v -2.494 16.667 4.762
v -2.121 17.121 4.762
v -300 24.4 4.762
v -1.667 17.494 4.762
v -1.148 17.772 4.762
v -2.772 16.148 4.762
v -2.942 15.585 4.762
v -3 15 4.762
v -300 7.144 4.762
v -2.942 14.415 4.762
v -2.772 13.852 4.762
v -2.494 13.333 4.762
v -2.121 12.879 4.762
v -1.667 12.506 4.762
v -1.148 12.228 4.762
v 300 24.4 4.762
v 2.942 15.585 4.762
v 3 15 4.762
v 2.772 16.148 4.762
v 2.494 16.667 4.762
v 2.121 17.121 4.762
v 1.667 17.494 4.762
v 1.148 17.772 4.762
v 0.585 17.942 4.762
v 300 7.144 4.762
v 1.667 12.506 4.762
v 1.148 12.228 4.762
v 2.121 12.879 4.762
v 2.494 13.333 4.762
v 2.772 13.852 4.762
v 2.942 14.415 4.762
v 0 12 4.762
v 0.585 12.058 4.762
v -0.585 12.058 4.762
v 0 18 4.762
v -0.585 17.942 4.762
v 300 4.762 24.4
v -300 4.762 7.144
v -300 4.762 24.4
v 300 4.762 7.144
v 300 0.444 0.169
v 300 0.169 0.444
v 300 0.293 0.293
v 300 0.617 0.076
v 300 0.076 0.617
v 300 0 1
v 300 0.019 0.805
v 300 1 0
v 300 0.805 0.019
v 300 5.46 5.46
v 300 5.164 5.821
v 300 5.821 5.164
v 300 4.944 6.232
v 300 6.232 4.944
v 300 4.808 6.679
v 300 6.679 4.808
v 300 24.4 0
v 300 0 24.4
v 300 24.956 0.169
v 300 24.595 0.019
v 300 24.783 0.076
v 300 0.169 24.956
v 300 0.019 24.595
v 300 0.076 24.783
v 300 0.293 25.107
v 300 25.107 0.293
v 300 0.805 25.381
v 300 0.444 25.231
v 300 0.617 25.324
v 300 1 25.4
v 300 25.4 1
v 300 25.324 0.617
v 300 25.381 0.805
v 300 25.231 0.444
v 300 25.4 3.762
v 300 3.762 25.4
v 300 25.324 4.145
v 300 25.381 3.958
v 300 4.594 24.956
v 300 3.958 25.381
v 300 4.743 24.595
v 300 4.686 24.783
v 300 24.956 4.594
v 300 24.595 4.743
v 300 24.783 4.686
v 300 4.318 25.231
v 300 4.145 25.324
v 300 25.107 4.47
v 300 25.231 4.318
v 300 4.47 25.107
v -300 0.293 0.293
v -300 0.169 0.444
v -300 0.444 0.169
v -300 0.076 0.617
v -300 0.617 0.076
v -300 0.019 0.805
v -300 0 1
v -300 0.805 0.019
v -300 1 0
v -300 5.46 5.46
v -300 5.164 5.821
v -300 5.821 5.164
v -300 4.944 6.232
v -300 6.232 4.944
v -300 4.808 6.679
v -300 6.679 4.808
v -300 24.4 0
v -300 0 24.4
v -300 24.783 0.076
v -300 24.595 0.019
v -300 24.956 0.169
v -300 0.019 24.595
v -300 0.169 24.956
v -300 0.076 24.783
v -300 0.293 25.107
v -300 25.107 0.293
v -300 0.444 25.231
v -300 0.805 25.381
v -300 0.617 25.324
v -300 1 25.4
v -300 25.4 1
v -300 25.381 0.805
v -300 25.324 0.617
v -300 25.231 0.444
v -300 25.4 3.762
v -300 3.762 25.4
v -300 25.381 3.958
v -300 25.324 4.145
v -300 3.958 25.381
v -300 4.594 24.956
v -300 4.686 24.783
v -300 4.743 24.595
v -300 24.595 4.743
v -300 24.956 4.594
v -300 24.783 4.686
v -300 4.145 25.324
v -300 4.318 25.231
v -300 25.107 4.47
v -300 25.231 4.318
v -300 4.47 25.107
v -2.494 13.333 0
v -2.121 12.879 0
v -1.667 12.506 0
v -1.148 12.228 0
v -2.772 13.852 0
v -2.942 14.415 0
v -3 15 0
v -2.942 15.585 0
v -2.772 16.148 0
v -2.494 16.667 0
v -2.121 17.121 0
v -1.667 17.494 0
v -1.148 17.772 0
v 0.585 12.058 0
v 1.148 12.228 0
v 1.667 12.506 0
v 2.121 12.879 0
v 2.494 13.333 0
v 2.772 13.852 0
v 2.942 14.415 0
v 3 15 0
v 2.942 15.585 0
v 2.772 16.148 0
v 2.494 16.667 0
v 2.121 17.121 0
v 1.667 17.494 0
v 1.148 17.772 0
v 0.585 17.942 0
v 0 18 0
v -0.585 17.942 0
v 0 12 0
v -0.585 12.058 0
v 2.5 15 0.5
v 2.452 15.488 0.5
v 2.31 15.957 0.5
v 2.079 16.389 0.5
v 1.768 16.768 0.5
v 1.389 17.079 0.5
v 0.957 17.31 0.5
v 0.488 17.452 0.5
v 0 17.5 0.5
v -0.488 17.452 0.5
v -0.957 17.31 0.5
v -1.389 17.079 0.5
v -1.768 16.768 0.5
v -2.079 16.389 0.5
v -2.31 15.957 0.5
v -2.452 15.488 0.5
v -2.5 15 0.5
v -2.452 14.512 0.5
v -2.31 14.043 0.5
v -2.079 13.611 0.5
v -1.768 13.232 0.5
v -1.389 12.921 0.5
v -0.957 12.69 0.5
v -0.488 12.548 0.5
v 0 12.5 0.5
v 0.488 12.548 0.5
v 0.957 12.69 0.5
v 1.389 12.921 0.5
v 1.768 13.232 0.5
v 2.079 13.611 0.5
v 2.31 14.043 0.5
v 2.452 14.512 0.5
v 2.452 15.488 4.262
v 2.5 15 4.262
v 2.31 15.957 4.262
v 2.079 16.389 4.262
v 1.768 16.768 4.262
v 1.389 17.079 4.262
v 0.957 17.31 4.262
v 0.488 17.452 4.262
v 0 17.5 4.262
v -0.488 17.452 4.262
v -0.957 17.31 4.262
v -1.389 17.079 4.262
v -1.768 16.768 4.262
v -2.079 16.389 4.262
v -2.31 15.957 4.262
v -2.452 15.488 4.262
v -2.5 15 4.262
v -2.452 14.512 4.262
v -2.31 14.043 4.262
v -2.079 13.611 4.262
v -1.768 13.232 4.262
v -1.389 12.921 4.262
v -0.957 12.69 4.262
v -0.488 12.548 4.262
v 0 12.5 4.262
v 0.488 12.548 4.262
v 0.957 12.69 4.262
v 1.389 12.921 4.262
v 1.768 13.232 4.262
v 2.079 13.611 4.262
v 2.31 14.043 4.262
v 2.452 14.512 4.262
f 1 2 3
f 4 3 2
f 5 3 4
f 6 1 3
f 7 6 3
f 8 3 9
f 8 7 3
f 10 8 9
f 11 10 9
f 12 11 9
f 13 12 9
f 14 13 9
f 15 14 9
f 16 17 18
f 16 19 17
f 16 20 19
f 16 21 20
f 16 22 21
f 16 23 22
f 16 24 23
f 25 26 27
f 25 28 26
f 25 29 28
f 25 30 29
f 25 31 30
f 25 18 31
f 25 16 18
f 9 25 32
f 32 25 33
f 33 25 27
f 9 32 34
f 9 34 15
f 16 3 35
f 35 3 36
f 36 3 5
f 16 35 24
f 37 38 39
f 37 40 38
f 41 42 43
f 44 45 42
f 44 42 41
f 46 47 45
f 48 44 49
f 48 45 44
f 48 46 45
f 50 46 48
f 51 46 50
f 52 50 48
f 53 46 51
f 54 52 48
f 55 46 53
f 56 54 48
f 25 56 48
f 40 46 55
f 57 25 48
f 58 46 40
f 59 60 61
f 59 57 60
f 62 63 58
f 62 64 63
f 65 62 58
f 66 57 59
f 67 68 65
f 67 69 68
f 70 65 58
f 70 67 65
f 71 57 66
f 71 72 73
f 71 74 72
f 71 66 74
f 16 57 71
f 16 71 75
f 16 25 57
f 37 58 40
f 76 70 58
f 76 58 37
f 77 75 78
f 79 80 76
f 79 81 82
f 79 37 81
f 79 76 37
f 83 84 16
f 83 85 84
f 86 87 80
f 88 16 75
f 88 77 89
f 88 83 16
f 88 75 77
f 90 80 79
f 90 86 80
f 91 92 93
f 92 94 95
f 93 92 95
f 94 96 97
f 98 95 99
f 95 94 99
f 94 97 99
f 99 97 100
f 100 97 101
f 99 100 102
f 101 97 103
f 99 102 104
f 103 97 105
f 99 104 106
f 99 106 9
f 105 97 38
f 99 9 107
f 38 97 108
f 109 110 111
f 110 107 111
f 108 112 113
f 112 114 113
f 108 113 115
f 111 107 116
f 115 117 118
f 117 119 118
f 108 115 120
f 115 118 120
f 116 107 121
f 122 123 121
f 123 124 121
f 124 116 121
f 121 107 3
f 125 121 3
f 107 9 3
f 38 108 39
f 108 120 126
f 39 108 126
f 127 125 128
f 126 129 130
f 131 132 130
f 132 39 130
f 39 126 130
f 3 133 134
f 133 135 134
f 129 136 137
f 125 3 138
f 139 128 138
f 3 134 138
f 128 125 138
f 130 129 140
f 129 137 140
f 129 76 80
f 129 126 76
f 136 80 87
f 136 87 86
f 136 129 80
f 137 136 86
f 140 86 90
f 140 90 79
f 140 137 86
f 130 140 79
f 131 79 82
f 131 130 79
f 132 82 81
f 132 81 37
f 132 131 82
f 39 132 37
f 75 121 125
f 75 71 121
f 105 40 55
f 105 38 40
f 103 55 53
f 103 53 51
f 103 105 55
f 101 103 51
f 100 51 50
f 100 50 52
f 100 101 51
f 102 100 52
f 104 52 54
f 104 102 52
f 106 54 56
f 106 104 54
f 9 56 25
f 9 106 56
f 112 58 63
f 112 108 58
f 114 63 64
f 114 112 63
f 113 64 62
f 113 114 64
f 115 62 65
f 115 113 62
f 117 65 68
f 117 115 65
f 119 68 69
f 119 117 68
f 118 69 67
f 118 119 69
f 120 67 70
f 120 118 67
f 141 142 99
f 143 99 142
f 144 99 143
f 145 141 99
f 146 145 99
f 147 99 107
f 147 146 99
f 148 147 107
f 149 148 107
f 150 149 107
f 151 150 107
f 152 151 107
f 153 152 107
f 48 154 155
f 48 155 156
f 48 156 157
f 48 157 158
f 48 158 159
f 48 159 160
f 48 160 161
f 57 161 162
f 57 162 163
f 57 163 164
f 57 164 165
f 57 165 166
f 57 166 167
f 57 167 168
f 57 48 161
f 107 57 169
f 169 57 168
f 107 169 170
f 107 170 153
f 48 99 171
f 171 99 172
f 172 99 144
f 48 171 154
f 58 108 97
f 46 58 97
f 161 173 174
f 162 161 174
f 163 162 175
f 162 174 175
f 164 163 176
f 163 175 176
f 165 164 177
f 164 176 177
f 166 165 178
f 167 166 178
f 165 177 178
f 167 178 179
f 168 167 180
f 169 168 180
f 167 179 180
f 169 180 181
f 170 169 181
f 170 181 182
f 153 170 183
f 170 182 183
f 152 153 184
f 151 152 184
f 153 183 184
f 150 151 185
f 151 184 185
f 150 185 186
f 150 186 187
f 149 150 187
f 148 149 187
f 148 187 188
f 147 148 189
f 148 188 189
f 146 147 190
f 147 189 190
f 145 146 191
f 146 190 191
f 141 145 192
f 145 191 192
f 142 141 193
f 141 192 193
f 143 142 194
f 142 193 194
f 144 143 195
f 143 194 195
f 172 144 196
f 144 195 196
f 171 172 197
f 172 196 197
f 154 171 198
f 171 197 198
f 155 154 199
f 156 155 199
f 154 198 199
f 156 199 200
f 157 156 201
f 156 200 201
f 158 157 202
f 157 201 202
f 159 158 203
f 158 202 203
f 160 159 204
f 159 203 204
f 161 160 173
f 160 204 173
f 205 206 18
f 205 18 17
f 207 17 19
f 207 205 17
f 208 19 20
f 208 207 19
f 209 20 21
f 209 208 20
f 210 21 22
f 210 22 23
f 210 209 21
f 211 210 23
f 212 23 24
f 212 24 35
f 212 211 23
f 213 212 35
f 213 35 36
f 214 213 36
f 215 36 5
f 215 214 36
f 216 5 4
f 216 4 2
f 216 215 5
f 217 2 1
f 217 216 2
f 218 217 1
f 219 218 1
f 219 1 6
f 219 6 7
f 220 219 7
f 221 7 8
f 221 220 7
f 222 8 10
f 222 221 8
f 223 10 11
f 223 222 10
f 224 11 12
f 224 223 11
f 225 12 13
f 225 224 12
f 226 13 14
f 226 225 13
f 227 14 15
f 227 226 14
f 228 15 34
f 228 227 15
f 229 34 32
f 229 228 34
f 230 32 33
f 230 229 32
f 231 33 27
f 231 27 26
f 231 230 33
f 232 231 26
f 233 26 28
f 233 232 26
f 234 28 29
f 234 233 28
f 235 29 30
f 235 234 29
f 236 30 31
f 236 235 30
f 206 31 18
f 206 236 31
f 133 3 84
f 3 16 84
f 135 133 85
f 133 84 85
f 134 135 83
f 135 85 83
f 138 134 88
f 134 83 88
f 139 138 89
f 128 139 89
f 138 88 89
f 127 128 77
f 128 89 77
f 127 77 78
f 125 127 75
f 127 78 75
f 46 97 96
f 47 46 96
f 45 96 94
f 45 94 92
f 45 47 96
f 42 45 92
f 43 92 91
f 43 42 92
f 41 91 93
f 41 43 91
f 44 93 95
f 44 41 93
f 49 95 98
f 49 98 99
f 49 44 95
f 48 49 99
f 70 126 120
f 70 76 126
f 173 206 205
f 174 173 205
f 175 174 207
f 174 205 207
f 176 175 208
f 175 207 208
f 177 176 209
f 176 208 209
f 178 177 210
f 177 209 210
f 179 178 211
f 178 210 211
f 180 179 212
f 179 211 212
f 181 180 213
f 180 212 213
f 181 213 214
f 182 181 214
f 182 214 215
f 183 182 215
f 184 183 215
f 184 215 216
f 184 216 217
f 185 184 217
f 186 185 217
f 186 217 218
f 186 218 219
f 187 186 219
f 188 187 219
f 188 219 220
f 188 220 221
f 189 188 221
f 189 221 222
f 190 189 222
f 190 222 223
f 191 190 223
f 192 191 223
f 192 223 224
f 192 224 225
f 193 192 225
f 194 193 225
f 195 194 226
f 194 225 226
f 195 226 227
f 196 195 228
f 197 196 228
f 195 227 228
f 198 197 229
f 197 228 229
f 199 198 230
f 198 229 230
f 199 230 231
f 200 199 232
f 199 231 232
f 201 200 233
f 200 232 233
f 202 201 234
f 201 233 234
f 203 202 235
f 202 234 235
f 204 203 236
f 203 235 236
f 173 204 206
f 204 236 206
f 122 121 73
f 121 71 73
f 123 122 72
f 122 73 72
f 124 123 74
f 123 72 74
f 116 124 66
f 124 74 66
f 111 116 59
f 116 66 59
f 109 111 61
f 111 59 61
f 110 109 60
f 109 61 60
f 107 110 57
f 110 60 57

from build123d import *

# Parameters (mm, degrees)
F1_DEPTH = 300
F2_R     = 1
F3_R     = 2.38125
F4_R     = 2.5
F5_DEPTH = 25
F6_SIZE  = 0.5


with BuildPart() as f1:
    # F0 (on Right) → F1 (new body, symmetric)
    with BuildSketch(Plane.YZ):
        Polygon((0, 25.4), (0, 0), (25.4, 0), (25.4, 4.7625), (4.7625, 4.7625), (4.7625, 25.4), align=None)
    extrude(amount=F1_DEPTH, both=True)

    # F2
    f2_edges = [f1.edges().sort_by_distance(p)[0] for p in [
        (0, 0, 25.4),
        (0, 4.7625, 25.4),
        (0, 0, 0),
        (0, 25.4, 4.7625),
        (0, 25.4, 0),
    ]]
    fillet(f2_edges, radius=F2_R)

    # F3
    f3_edges = [f1.edges().sort_by_distance(p)[0] for p in [
        (0, 4.7625, 4.7625),
    ]]
    fillet(f3_edges, radius=F3_R)

    # F4 (on face) → F5 (cut)
    with BuildSketch(Plane.XY.offset(4.7625)):
        with Locations((0, 15)):
            Circle(F4_R)
    extrude(amount=-F5_DEPTH, mode=Mode.SUBTRACT)

    # F6
    f6_edges = [f1.edges().sort_by_distance(p)[0] for p in [
        (-2.5, 15, 4.7625),
        (2.5, 15, 2.38125),
        (-2.5, 15, 0),
    ]]
    chamfer(f6_edges, length=F6_SIZE)


solid = f1.part
